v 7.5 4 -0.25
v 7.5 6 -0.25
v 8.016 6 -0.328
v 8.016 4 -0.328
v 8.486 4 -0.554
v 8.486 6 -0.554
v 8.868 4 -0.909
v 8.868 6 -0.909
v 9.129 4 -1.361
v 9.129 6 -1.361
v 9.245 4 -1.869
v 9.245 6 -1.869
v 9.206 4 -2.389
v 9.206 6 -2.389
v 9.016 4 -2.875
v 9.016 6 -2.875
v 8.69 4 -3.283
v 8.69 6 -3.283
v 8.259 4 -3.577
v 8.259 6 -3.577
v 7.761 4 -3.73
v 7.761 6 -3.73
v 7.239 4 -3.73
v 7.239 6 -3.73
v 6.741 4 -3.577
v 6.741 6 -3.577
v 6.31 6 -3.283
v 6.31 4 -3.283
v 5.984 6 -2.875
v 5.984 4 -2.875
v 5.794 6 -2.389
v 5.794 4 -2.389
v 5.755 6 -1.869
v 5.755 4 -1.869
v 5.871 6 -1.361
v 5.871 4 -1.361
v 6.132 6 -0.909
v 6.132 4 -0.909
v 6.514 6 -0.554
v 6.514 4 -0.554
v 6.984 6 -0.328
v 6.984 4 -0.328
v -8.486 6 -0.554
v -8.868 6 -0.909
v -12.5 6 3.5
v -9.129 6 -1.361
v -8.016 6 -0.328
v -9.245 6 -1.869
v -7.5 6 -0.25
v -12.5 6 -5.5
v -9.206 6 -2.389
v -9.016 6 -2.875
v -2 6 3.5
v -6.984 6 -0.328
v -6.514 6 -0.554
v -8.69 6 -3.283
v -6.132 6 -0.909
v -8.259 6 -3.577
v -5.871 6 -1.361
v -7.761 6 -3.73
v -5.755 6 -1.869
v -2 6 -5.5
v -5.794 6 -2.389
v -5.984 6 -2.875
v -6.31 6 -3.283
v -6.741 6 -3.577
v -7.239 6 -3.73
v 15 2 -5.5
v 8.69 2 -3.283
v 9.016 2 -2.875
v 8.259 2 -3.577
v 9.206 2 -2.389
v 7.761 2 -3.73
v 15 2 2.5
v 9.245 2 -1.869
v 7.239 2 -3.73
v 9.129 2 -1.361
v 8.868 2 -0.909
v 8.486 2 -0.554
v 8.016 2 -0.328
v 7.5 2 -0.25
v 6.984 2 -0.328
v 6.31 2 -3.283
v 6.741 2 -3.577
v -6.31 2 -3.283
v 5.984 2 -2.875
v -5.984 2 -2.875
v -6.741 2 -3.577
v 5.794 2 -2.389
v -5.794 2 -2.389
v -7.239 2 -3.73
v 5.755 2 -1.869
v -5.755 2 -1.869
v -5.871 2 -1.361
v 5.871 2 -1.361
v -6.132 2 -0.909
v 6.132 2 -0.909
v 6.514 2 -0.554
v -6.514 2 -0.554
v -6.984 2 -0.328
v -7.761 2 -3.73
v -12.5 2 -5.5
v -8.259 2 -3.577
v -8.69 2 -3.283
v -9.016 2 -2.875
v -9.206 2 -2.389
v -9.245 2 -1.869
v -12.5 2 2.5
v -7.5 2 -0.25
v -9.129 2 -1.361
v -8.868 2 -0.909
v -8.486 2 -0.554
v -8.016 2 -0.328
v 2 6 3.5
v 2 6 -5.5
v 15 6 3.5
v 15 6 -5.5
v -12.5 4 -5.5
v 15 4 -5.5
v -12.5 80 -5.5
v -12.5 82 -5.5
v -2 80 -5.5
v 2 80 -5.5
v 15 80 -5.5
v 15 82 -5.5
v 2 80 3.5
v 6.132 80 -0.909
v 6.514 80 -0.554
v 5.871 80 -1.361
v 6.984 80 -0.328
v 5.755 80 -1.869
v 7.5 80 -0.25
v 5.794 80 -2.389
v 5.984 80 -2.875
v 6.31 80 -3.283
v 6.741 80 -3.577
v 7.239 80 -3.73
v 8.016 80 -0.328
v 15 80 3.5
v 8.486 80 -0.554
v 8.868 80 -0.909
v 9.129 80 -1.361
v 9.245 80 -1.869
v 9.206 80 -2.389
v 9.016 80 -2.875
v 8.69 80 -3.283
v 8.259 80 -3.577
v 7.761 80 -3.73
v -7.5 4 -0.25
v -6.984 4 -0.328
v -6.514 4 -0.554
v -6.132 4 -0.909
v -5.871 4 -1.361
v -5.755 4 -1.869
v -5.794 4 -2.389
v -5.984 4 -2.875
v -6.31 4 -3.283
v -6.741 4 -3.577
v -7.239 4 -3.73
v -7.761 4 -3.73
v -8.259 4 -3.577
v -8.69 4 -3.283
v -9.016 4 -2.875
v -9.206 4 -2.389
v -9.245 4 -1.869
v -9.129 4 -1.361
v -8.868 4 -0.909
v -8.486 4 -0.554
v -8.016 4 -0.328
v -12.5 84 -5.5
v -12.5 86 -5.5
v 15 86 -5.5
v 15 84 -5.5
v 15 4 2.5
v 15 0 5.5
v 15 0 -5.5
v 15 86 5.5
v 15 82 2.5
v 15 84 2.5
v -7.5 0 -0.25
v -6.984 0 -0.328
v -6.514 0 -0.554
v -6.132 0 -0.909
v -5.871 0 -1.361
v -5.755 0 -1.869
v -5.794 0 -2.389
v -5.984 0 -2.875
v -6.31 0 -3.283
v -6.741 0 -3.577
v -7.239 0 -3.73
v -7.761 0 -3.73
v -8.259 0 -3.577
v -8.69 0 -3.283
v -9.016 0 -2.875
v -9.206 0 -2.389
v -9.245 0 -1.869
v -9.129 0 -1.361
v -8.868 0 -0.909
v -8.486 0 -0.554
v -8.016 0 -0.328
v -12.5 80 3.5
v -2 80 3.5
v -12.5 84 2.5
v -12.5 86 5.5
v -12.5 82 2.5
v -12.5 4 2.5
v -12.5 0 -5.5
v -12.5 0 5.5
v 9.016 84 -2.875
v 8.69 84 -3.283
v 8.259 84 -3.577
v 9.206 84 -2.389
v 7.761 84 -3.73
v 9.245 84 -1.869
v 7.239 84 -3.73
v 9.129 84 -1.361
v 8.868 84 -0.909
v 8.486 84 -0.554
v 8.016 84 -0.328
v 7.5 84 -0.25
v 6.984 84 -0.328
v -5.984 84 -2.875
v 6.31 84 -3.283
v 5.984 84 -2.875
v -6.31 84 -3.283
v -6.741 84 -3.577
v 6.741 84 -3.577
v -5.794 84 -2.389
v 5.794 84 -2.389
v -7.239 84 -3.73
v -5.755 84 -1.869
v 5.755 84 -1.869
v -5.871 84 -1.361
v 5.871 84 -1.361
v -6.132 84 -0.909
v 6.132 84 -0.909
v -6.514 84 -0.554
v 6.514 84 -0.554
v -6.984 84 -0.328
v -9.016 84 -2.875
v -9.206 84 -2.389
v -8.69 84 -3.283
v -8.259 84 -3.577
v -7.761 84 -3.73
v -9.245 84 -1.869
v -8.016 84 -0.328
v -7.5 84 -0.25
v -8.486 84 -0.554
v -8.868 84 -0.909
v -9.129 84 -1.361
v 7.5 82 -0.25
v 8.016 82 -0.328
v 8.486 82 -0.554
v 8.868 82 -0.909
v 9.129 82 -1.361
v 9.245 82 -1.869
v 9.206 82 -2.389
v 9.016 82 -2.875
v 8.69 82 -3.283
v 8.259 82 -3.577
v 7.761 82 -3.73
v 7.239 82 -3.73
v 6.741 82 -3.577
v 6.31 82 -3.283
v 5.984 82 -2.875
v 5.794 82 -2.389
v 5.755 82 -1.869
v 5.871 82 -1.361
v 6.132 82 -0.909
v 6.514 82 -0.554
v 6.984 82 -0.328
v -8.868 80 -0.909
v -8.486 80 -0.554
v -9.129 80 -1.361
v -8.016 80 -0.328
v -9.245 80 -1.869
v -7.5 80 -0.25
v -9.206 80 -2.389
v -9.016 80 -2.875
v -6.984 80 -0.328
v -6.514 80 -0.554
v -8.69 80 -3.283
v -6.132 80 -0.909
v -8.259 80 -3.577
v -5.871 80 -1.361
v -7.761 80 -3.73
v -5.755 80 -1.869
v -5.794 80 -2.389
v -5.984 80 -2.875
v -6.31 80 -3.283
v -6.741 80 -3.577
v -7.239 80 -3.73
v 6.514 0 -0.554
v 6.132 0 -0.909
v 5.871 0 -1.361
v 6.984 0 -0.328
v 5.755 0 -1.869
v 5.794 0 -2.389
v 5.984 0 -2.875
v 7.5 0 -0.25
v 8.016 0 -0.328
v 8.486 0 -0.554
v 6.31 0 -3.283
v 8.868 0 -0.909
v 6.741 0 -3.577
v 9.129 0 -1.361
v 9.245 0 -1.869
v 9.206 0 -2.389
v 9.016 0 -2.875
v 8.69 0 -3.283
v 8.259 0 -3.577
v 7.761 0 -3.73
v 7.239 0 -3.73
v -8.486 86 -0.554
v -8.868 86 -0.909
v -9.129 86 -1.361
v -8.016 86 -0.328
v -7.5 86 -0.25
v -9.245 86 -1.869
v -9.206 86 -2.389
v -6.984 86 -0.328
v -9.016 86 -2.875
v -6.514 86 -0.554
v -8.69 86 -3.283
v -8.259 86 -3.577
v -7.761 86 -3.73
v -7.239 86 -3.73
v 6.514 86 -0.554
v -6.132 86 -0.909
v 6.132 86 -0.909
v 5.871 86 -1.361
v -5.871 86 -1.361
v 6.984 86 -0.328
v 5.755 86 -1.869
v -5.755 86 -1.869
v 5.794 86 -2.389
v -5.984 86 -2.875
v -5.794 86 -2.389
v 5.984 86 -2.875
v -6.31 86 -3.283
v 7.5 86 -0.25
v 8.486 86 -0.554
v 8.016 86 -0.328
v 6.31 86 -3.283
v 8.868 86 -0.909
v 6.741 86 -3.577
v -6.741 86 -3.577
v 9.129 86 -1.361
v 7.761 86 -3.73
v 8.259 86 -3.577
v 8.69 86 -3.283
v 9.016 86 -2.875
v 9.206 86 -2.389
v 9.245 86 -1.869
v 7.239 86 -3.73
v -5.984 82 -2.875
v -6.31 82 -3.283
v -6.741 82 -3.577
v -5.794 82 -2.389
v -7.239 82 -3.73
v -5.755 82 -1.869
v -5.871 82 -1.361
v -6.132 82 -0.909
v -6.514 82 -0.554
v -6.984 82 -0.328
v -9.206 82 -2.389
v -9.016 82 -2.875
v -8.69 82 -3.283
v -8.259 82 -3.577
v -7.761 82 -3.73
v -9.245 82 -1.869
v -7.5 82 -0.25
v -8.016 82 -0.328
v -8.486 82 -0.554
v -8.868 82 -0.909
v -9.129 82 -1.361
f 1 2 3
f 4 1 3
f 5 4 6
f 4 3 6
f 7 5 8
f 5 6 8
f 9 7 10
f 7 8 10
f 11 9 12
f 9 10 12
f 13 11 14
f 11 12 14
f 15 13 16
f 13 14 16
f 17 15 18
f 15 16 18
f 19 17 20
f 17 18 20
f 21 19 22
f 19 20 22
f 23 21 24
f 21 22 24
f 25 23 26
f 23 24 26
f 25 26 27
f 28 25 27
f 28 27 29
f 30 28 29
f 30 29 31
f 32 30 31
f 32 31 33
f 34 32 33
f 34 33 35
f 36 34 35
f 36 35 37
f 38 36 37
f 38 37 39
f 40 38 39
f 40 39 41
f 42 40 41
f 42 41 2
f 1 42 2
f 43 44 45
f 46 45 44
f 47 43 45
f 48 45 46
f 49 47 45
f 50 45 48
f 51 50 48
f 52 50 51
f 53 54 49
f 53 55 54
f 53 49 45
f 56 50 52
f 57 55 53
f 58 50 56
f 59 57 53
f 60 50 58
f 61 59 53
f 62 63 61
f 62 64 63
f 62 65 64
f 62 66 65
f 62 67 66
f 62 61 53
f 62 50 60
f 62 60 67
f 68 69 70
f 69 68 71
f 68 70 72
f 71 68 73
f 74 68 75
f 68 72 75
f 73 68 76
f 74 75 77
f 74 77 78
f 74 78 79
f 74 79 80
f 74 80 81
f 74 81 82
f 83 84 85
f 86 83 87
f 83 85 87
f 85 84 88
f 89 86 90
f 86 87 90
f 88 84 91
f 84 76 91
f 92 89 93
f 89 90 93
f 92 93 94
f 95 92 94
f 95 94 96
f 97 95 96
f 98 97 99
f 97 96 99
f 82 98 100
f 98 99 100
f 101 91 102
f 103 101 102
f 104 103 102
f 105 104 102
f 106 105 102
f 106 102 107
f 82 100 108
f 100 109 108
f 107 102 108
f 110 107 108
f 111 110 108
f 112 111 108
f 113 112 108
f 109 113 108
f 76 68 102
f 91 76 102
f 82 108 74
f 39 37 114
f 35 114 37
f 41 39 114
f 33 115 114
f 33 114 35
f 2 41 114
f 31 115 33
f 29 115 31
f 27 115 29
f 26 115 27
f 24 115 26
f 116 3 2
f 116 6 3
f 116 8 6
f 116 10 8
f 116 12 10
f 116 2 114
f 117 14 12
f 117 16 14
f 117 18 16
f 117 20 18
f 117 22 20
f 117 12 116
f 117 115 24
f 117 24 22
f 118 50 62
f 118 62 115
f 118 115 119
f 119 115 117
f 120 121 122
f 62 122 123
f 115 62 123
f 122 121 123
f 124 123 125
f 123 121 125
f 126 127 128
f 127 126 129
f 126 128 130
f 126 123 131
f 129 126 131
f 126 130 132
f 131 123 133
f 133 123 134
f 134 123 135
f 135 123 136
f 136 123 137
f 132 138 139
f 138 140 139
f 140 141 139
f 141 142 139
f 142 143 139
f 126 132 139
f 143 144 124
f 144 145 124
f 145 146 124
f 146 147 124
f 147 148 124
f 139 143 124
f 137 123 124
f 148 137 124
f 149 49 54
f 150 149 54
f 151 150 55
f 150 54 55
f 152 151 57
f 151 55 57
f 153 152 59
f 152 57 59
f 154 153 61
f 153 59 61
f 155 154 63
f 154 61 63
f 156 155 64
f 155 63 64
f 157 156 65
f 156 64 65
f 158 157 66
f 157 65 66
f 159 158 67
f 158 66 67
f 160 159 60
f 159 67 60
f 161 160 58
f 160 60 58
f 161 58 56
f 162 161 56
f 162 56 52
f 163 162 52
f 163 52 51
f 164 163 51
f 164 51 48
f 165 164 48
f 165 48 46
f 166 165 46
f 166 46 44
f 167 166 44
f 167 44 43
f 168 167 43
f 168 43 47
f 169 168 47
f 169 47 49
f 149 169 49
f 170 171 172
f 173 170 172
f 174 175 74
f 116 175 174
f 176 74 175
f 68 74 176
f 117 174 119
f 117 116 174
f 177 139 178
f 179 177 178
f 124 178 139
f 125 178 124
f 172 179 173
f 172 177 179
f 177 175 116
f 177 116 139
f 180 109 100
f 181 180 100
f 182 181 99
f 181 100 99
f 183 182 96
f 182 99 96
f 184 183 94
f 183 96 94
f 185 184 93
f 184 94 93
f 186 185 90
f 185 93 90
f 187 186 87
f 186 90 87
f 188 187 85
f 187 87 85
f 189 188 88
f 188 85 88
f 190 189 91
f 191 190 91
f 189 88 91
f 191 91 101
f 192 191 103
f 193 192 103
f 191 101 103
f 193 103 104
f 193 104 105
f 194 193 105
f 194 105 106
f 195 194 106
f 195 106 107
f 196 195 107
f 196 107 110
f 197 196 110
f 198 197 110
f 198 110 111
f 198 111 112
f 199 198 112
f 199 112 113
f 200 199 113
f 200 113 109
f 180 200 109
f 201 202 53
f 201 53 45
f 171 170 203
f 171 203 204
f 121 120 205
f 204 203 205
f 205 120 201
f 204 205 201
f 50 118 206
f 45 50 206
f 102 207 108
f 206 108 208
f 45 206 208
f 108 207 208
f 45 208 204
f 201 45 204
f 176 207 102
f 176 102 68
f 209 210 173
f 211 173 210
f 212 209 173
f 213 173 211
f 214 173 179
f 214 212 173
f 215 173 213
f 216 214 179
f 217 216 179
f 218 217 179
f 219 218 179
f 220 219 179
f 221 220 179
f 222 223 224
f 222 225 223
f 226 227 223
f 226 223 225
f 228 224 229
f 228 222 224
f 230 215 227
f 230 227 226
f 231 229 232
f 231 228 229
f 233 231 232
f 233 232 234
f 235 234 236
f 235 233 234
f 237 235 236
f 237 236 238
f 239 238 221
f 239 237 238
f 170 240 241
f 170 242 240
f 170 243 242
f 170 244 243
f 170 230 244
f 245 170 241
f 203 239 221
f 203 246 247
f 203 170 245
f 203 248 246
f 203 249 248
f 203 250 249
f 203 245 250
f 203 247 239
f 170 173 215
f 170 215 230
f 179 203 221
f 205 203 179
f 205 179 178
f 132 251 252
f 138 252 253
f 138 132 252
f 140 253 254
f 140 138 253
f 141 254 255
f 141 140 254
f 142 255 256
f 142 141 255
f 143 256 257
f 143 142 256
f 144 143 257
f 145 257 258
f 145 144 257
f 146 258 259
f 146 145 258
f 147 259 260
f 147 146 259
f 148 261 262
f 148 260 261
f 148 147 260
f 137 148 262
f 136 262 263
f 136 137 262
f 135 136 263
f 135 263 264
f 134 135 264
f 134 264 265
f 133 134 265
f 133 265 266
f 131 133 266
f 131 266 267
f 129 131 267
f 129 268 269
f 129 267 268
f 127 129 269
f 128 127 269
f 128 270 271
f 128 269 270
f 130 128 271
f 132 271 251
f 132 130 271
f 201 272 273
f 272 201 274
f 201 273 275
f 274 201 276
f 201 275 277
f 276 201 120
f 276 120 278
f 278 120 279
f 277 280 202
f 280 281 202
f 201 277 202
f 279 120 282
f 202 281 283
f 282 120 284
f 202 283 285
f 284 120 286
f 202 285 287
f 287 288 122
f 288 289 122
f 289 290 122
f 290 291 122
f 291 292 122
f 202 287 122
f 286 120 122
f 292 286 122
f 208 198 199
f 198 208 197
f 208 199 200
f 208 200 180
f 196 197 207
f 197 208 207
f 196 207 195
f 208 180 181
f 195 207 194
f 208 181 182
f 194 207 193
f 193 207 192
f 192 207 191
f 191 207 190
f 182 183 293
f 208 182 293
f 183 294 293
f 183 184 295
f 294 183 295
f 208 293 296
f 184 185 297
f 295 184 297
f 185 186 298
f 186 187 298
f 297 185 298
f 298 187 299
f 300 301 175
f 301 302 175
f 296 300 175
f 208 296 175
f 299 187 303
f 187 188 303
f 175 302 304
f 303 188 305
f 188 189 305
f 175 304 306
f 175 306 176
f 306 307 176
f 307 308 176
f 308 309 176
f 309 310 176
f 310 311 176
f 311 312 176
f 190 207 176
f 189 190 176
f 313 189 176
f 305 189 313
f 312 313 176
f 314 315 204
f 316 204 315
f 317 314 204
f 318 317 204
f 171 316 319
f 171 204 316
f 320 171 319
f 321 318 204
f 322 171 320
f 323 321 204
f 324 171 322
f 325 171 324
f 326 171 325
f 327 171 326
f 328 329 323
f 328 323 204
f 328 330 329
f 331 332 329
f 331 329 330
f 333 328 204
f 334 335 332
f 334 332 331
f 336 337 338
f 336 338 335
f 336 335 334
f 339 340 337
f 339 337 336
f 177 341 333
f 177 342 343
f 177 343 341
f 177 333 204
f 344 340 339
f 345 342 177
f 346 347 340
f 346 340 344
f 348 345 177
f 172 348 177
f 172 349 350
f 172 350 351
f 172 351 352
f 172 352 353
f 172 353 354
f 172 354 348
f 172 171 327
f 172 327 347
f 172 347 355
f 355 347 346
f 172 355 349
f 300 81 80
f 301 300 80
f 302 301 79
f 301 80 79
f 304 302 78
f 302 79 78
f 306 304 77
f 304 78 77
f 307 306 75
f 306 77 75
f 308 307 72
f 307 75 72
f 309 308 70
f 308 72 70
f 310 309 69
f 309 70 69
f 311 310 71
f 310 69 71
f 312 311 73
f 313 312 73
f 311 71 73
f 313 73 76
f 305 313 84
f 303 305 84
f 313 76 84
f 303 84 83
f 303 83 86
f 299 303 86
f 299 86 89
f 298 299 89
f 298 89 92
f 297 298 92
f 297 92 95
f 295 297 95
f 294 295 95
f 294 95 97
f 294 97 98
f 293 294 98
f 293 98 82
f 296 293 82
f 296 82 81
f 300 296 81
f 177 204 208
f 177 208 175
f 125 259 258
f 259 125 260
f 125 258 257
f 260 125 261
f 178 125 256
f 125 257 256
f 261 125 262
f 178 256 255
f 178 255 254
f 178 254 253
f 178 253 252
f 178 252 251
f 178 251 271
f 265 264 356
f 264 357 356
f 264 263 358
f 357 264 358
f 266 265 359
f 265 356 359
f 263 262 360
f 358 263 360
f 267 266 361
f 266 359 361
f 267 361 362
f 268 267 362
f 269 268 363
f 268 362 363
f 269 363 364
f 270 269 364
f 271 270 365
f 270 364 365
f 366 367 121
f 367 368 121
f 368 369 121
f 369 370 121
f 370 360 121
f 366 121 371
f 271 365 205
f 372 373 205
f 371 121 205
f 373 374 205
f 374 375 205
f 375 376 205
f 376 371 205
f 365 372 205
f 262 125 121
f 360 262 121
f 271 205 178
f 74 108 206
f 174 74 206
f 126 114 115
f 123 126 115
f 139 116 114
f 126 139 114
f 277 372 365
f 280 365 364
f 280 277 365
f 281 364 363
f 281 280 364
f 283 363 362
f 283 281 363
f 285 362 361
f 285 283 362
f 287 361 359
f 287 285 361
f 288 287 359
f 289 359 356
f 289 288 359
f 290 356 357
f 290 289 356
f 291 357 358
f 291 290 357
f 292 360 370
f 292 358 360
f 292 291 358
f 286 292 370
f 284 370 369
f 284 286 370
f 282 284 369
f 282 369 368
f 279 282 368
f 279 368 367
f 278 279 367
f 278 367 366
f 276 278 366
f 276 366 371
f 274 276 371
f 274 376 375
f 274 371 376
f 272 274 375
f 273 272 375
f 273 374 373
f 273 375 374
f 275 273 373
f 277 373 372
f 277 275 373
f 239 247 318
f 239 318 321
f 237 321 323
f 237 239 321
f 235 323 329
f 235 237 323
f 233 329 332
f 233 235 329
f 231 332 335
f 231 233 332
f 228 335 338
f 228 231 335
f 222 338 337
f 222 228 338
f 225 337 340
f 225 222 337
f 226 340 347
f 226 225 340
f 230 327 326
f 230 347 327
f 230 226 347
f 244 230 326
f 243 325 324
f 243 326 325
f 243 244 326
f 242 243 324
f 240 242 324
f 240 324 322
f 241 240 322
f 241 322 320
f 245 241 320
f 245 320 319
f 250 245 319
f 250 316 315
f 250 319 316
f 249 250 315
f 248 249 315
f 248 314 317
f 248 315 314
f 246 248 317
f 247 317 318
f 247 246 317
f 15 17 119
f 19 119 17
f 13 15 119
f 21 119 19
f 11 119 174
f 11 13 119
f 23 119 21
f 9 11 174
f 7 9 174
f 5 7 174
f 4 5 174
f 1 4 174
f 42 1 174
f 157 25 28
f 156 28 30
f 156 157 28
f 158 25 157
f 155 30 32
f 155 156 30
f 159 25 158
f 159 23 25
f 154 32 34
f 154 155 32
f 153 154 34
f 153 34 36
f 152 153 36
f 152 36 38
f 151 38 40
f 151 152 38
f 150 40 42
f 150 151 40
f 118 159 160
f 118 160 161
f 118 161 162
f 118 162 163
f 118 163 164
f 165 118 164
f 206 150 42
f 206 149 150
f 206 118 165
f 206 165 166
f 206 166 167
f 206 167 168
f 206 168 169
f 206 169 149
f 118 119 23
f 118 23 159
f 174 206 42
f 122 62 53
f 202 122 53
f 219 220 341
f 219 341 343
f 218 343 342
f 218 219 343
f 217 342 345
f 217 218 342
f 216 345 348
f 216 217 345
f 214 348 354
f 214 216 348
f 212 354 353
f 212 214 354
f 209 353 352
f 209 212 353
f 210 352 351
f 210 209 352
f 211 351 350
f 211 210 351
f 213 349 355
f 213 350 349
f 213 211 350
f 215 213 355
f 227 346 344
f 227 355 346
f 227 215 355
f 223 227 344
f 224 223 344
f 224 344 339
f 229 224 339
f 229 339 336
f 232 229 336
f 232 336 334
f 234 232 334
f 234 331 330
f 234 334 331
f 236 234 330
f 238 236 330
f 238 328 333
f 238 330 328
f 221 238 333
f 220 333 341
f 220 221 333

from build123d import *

# Parameters (mm, degrees)
SKETCH_1_W          = 30
SKETCH_1_H          = 11
EXTRUDE_1_DEPTH     = 6
SKETCH_2_W          = 16
SKETCH_2_H          = 2
CUT_EXTRUDE_1_DEPTH = 144
EXTRUDE_2_DEPTH     = 74
SKETCH_4_R          = 1.75
CUT_EXTRUDE_2_DEPTH = 144
SKETCH_5_W          = 11
SKETCH_5_H          = 80
CUT_EXTRUDE_3_DEPTH = 2.5


with BuildPart() as part:
    # 草图1 → 凸台-拉伸1 (new body)
    with BuildSketch(Plane(origin=(0, 0, 0), x_dir=(1, 0, 0), z_dir=(0, 1, 0))):
        Rectangle(SKETCH_1_W, SKETCH_1_H)
    extrude_1 = extrude(amount=EXTRUDE_1_DEPTH)

    # 草图2 → 切除-拉伸1 (cut)
    with BuildSketch(Plane.ZY.offset(15)):
        with Locations((-5.5, 3)):
            Rectangle(SKETCH_2_W, SKETCH_2_H)
    cut_extrude_1 = extrude(amount=-CUT_EXTRUDE_1_DEPTH, mode=Mode.SUBTRACT)

    # 草图3 → 凸台-拉伸2 (add)
    with BuildSketch(Plane(origin=(0, 6, 0), x_dir=(1, 0, 0), z_dir=(0, 1, 0))):
        Polygon((2, 5.5), (-2, 5.5), (-2, -3.5), (-15, -3.5), (-15, -5.5), (15, -5.5), (15, -3.5), (2, -3.5), align=None)
    extrude(amount=EXTRUDE_2_DEPTH)

    # 草图4 → 切除-拉伸2 (cut)
    with BuildSketch(Plane(origin=(0, 6, 0), x_dir=(1, 0, 0), z_dir=(0, 1, 0))):
        with Locations(Location((-7.5, 2, 0), (0, 0, 270))):
            Circle(SKETCH_4_R)
        with Locations(Location((7.5, 2, 0), (0, 0, 270))):
            Circle(SKETCH_4_R)
    cut_extrude_2 = extrude(amount=-CUT_EXTRUDE_2_DEPTH, mode=Mode.SUBTRACT)

    # 草图5 → 切除-拉伸3 (cut)
    with BuildSketch(Plane.ZY.offset(15)):
        with Locations((0, 40)):
            Rectangle(SKETCH_5_W, SKETCH_5_H)
    cut_extrude_3 = extrude(amount=-CUT_EXTRUDE_3_DEPTH, mode=Mode.SUBTRACT)

    # 镜向1: 凸台-拉伸1, 切除-拉伸1, 切除-拉伸2, 切除-拉伸3 across plane
    add(extrude_1.mirror(Plane.ZX.offset(43)))
    add(cut_extrude_1.mirror(Plane.ZX.offset(43)), mode=Mode.SUBTRACT)
    add(cut_extrude_2.mirror(Plane.ZX.offset(43)), mode=Mode.SUBTRACT)
    add(cut_extrude_3.mirror(Plane.ZX.offset(43)), mode=Mode.SUBTRACT)


solid = part.part
